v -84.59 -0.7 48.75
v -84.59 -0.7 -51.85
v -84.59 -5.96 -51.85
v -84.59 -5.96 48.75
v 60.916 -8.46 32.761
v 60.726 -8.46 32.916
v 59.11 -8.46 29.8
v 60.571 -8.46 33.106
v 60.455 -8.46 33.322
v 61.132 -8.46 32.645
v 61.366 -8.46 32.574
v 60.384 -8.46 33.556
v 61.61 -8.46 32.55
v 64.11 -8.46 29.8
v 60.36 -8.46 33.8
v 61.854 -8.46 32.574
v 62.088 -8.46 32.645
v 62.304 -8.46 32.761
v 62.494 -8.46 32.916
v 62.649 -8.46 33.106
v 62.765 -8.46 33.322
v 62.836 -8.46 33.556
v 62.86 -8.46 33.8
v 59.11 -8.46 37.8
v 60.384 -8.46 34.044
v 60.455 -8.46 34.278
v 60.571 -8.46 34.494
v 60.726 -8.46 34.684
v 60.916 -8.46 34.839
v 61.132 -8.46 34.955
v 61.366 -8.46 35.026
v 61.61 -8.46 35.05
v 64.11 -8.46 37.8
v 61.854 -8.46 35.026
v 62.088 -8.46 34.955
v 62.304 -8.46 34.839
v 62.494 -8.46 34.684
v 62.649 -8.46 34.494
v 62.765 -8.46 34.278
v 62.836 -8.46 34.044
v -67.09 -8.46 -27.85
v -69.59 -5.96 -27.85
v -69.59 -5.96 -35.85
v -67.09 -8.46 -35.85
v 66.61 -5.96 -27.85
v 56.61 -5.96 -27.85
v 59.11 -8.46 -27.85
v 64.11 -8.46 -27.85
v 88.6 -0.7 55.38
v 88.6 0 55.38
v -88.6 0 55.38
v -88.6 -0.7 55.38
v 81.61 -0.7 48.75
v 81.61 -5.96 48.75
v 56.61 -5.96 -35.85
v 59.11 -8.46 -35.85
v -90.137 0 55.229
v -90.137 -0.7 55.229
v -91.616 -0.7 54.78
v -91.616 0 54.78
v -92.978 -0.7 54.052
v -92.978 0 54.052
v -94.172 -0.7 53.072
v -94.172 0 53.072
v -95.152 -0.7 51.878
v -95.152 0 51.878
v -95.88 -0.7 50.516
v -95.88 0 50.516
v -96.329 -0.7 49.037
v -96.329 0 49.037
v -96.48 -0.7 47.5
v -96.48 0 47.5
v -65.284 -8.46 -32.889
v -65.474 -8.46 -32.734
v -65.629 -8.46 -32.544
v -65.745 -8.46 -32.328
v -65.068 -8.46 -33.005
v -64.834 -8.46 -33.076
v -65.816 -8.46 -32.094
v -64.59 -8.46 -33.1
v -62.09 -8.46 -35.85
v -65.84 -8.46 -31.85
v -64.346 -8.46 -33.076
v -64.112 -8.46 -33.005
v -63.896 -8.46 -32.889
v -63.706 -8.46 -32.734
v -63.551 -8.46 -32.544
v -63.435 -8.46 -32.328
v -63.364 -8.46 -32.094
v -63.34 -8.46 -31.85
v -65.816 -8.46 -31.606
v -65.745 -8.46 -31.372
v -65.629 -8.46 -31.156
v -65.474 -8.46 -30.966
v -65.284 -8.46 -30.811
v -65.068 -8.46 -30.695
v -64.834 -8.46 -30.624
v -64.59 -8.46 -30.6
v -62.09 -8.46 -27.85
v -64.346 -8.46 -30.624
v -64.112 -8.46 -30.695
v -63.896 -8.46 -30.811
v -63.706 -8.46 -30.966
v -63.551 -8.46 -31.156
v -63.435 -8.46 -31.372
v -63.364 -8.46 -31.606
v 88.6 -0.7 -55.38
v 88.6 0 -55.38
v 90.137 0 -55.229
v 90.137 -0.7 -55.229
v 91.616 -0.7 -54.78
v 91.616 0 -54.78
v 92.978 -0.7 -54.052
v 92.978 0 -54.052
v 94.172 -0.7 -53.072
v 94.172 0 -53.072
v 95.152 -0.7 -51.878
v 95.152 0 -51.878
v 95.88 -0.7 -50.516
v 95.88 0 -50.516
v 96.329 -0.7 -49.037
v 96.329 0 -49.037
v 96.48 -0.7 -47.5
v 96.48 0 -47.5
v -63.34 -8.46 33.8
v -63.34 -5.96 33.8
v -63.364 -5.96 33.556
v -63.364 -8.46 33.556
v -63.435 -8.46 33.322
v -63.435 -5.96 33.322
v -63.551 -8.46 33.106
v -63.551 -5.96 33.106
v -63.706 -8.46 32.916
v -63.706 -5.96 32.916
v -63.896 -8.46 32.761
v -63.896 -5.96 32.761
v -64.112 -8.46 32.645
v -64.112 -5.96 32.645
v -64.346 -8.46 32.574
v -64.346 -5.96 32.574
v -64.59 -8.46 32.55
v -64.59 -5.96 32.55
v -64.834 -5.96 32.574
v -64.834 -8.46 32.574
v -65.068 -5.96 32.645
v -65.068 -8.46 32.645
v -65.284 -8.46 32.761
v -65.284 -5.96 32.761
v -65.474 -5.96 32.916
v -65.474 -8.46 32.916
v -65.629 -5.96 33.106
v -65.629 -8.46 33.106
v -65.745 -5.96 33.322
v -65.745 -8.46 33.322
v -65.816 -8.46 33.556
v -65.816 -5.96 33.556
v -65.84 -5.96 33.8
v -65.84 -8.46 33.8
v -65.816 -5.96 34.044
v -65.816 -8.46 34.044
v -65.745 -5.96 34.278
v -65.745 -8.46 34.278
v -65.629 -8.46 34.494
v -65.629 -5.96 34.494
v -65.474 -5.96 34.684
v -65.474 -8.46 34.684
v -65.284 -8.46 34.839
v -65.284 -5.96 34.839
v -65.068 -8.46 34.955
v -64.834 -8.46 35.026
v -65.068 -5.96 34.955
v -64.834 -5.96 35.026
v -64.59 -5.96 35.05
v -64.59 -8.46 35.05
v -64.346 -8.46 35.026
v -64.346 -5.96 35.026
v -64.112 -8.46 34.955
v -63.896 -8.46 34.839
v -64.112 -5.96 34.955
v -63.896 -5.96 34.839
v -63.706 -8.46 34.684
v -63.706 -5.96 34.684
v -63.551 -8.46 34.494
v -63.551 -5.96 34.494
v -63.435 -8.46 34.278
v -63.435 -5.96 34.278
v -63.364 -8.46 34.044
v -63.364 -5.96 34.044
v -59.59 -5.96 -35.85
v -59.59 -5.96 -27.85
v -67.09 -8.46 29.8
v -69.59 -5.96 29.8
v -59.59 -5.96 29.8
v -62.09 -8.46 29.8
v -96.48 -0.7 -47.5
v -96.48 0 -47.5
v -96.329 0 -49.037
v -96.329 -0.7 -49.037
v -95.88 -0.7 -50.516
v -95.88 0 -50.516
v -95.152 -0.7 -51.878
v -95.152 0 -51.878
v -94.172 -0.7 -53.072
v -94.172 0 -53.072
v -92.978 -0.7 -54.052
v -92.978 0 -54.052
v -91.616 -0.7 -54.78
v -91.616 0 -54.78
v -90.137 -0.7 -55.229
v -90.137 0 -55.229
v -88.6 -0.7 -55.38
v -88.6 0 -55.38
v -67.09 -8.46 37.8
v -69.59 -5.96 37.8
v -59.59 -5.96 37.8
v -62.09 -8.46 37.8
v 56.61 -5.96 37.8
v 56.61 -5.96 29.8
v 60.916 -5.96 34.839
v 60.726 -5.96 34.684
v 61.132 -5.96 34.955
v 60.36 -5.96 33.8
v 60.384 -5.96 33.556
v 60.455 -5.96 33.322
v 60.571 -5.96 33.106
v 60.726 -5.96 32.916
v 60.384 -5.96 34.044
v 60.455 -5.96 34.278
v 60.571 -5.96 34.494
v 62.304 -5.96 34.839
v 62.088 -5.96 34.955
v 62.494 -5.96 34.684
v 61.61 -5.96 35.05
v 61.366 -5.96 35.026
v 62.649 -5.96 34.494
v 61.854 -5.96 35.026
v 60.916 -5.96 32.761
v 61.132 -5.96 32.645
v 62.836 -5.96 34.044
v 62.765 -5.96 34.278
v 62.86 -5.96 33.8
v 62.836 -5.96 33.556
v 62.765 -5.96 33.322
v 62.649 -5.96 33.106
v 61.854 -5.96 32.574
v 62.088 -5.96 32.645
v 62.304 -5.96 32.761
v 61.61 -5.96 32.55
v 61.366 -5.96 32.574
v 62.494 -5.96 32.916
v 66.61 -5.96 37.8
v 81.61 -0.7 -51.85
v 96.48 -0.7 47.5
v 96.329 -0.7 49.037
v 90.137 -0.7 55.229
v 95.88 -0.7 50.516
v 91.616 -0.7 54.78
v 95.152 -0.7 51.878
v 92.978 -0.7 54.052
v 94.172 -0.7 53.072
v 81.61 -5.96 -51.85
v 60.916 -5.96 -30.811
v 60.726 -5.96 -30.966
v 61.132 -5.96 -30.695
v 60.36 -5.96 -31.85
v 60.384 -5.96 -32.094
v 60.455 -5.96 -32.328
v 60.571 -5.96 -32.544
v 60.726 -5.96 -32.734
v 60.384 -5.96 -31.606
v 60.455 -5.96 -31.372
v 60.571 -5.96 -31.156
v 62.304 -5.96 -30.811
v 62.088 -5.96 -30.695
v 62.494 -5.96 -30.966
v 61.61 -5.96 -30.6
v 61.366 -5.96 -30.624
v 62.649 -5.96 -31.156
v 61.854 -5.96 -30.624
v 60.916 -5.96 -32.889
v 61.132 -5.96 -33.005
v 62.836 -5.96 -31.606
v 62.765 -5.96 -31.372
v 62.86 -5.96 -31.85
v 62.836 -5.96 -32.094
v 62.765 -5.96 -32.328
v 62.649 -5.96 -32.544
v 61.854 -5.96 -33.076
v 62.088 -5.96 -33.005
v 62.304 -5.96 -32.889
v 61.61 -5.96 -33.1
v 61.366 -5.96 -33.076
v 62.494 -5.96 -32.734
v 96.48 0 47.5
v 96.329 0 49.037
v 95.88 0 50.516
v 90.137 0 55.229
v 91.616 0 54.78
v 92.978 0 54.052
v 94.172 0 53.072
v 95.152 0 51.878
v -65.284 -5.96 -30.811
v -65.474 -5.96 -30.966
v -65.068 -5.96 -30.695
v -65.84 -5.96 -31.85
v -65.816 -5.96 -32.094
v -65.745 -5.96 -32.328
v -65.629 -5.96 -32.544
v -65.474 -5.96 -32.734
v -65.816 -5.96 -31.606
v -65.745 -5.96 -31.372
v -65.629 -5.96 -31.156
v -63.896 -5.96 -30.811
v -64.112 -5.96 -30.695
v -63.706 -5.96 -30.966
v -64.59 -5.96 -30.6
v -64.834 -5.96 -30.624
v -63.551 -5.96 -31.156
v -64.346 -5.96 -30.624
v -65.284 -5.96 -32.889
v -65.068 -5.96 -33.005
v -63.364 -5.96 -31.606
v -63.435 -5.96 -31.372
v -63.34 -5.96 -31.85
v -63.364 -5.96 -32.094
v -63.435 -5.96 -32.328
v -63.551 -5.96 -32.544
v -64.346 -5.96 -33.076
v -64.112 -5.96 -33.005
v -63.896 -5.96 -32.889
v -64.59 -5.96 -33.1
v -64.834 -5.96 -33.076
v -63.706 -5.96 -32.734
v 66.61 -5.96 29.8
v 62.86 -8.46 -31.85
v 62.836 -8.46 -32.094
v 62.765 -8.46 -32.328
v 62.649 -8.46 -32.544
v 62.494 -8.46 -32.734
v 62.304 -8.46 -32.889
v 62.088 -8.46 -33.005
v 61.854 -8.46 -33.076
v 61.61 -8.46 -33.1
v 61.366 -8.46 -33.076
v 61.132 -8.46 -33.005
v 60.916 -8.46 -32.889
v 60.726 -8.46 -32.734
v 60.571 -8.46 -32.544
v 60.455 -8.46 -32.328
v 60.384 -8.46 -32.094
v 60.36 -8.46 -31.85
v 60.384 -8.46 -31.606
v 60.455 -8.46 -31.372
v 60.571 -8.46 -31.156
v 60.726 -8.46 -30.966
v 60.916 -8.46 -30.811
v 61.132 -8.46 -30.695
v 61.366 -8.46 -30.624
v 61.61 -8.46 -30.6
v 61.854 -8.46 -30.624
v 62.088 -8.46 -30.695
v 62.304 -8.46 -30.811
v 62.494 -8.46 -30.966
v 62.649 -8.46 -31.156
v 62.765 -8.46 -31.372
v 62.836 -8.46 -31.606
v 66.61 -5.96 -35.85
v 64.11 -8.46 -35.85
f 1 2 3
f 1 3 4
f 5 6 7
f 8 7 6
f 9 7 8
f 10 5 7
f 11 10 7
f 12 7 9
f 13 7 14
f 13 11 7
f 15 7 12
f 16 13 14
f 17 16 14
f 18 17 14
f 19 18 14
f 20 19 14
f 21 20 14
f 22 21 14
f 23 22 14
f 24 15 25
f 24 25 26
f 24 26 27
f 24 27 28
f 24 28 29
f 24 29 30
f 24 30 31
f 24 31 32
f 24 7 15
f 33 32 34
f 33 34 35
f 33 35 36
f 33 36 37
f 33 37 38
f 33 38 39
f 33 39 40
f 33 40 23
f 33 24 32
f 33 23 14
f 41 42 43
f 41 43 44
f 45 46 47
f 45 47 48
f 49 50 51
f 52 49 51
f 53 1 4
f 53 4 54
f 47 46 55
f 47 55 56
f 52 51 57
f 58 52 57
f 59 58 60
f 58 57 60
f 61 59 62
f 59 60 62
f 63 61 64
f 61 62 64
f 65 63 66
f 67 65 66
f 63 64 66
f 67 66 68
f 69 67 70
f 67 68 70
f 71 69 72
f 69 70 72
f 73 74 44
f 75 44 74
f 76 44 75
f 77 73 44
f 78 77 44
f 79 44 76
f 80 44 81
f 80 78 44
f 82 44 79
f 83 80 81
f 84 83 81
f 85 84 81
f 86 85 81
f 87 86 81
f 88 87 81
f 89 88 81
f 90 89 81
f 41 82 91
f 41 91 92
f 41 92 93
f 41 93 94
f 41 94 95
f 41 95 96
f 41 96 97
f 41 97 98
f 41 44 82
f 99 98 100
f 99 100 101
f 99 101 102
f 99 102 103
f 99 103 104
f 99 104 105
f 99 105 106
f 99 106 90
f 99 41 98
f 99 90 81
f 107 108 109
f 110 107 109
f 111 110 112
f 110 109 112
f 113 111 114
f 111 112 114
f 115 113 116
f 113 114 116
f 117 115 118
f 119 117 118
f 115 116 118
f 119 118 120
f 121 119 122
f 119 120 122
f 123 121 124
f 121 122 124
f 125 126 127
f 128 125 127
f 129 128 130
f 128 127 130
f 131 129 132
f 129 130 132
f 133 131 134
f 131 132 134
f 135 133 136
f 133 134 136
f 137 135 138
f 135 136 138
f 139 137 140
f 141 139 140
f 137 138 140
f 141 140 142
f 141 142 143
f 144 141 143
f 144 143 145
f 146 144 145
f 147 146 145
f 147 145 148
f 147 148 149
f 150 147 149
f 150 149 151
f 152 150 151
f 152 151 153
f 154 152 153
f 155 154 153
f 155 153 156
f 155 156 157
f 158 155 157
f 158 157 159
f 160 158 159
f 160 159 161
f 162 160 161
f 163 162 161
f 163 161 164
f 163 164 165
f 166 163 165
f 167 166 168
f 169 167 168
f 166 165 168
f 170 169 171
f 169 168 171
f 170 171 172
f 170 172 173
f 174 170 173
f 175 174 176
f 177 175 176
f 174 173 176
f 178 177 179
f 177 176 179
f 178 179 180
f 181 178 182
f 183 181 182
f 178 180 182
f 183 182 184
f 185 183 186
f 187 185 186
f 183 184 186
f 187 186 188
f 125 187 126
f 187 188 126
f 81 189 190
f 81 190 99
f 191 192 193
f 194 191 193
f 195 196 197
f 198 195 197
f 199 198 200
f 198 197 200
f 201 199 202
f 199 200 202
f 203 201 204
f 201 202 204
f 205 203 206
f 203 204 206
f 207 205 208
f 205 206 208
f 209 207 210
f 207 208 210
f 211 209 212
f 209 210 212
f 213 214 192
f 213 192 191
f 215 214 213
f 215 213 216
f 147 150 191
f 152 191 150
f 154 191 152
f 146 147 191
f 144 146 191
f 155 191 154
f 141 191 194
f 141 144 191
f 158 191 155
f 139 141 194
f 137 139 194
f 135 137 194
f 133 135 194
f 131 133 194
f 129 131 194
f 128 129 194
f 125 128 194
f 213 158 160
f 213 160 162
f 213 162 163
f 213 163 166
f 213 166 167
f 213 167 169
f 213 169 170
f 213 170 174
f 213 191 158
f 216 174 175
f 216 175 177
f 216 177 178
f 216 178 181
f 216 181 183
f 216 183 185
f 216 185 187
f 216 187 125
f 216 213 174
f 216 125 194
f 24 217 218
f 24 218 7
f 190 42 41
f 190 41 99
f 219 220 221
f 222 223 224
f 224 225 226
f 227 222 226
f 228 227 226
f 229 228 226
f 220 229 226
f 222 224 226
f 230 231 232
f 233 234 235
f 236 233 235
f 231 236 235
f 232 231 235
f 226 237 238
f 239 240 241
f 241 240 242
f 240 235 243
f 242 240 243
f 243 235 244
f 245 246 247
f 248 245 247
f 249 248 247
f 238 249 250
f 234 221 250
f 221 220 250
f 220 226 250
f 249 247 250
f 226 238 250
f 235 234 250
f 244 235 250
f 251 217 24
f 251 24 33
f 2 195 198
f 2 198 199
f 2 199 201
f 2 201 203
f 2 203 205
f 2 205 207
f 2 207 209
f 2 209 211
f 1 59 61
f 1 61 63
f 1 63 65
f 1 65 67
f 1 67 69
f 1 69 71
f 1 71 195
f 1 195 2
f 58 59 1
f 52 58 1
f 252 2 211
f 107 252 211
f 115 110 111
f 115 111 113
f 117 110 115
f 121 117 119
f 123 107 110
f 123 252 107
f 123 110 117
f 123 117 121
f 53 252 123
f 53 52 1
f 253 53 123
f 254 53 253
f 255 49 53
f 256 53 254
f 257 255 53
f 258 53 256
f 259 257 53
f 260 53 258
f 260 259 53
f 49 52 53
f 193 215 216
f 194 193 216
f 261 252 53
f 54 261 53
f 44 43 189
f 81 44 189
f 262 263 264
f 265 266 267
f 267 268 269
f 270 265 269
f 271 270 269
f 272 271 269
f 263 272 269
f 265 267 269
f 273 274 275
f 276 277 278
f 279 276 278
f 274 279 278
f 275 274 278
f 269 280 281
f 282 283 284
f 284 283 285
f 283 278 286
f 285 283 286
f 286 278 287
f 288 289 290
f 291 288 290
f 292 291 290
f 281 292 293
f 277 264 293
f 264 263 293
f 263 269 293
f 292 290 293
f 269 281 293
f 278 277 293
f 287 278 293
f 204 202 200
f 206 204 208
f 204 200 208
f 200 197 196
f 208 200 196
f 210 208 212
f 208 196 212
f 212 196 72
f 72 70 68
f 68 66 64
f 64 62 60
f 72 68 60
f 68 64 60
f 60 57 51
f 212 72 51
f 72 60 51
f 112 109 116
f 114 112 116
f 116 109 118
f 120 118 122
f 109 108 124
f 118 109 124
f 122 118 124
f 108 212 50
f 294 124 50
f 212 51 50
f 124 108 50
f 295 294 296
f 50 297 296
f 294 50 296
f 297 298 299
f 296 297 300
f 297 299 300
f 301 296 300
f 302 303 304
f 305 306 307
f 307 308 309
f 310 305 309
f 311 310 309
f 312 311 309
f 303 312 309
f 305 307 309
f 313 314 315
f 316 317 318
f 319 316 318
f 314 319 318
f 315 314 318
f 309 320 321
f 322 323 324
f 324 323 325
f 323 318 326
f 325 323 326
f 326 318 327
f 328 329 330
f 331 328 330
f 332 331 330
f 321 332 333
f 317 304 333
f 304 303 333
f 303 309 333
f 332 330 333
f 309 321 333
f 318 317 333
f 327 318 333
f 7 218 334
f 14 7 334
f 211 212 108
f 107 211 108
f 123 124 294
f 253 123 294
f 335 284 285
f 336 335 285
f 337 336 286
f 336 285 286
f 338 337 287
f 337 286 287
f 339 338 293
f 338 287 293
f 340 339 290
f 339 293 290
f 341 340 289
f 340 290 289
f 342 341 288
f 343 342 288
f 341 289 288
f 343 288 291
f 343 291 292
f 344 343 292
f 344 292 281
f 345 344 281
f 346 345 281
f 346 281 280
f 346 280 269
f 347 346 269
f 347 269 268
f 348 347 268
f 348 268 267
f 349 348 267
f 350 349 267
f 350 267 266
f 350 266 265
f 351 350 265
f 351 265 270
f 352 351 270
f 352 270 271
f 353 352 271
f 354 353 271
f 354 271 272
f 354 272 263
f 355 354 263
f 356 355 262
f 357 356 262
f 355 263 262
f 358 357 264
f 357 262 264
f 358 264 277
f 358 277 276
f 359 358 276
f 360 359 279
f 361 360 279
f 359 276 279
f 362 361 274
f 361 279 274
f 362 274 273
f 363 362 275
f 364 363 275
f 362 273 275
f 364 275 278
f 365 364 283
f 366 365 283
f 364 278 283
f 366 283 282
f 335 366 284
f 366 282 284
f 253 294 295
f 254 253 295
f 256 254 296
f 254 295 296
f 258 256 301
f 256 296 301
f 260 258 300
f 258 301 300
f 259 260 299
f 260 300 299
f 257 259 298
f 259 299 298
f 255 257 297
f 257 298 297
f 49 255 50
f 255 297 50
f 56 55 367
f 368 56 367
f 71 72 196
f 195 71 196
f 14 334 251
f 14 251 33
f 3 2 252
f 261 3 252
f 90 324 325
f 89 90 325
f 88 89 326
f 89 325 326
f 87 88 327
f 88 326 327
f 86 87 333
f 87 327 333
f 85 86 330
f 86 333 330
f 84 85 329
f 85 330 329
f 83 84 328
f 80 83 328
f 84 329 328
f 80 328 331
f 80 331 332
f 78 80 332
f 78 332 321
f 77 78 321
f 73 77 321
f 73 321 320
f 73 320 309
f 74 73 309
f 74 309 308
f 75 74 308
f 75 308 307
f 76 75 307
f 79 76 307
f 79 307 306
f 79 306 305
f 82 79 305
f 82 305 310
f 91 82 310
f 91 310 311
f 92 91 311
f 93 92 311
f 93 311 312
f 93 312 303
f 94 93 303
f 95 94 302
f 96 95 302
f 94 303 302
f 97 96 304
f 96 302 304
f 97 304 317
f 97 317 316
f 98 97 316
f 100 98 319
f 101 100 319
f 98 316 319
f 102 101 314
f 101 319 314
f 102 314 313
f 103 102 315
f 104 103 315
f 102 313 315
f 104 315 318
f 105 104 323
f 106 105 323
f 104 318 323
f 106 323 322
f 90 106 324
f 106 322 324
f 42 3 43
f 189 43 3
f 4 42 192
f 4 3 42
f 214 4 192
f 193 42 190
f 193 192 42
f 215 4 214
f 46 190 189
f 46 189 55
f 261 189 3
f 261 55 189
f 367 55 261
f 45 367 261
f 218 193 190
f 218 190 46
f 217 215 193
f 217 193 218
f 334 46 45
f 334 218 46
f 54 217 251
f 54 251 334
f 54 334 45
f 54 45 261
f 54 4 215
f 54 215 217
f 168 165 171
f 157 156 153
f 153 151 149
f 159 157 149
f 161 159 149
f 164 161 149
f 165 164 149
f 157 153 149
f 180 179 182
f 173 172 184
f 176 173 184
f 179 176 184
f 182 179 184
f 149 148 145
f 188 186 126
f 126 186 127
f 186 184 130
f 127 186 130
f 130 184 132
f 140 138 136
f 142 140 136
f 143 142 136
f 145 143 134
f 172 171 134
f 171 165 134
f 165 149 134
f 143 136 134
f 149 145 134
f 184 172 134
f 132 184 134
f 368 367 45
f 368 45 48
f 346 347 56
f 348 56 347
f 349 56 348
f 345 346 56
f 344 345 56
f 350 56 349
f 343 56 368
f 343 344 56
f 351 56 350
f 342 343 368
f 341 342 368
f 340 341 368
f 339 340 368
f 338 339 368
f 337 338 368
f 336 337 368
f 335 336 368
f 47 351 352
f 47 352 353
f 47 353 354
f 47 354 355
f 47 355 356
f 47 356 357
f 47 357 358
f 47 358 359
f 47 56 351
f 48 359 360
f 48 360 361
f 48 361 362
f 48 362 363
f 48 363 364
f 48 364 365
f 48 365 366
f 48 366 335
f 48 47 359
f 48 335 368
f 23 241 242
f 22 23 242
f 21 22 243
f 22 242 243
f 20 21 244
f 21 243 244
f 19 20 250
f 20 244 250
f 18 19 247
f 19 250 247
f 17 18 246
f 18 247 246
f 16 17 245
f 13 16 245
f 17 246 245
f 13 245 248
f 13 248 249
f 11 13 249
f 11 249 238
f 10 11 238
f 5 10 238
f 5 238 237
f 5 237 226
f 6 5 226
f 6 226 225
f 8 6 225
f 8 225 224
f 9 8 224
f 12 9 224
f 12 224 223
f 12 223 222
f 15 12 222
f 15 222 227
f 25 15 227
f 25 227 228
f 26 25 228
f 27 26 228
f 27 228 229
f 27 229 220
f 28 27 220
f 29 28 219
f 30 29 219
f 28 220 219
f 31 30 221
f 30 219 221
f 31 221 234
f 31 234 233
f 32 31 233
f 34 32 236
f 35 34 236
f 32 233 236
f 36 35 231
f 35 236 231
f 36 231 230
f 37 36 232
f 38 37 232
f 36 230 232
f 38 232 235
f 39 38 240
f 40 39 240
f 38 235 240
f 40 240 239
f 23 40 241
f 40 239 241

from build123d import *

# Parameters (mm, degrees)
F0_W         = 166.2
F0_H         = 100.6
F1_DEPTH     = 5.96
F2_DEPTH     = 0.7
F3_W         = 15
F3_H         = 8
F4_DEPTH     = 2.5
F5_T4_DEPTH  = 33.7168298797
F5_T9_DEPTH  = 33.7168298797
F5_T14_DEPTH = 33.7168298797
F5_T19_DEPTH = 33.7168298797
F5_T24_DEPTH = 33.7168298797
F5_T29_DEPTH = 33.7168298797
F5_T34_DEPTH = 33.7168298797
F5_T39_DEPTH = 33.7168298797
F6_D         = 2.5
F6_DEPTH     = 2.501


# Not quite as in the source:
# - a fillet or chamfer that OpenCascade refuses, or shapes differently, is made with other operations: its cross-section is extruded or revolved along the edge and cut away or added


with BuildPart() as f1:
    # F0 (on Front) → F1 (new body)
    with BuildSketch(Plane.XZ):
        with Locations((-1.49, -1.55)):
            Rectangle(F0_W, F0_H)
    extrude(amount=F1_DEPTH)

    # F0 (on Front) → F2 (join)
    with BuildSketch(Plane.XZ):
        with BuildLine():
            ThreePointArc((-96.48, -47.5), (-94.1720014358, -53.0720014358), (-88.6, -55.38))
            Line((-88.6, -55.38), (88.6, -55.38))
            ThreePointArc((88.6, -55.38), (94.1720014357, -53.0720014357), (96.48, -47.5))
            Line((96.48, -47.5), (96.48, 47.5))
            ThreePointArc((96.48, 47.5), (94.1720014358, 53.0720014358), (88.6, 55.38))
            Line((88.6, 55.38), (-88.6, 55.38))
            ThreePointArc((-88.6, 55.38), (-94.1720014357, 53.0720014357), (-96.48, 47.5))
            Line((-96.48, 47.5), (-96.48, -47.5))
        make_face()
        with Locations((-1.49, -1.55)):
            Rectangle(F0_W, F0_H, mode=Mode.SUBTRACT)
    extrude(amount=F2_DEPTH)

    # F3 (on face) → F4 (join)
    with BuildSketch(Plane.XZ.offset(5.96)):
        with Locations((-64.59, 33.8)):
            Rectangle(F3_W, F3_H)
        with Locations((-64.59, -31.85)):
            Rectangle(F3_W, F3_H)
        with Locations((61.61, -31.85)):
            Rectangle(F3_W, F3_H)
        with Locations((61.61, 33.8)):
            Rectangle(F3_W, F3_H)
    extrude(amount=F4_DEPTH)

    # F5: chamfer of 5 on 8 edges, made by hand


with BuildPart() as f5_tool2:
    # F5_s3 → F5_t4 (new body)
    with BuildSketch(Plane.XY.offset(50.6584149398)):
        Polygon((-72.09, -3.46), (-67.09, -8.46), (-72.09, -8.46), align=None)
    extrude(amount=-F5_T4_DEPTH)

    split(bisect_by=Plane.XZ.offset(5.96), keep=Keep.TOP)


with BuildPart() as f1_1:
    add(f1.part)

    # F5_t1: cut F5_tool2
    add(f5_tool2.part, mode=Mode.SUBTRACT)


with BuildPart() as f5_tool7:
    # F5_s8 → F5_t9 (new body)
    with BuildSketch(Plane.XY.offset(16.9415850602)):
        Polygon((-57.09, -3.46), (-62.09, -8.46), (-57.09, -8.46), align=None)
    extrude(amount=F5_T9_DEPTH)

    split(bisect_by=Plane.XZ.offset(5.96), keep=Keep.TOP)


with BuildPart() as f1_2:
    add(f1_1.part)

    # F5_t6: cut F5_tool7
    add(f5_tool7.part, mode=Mode.SUBTRACT)


with BuildPart() as f5_tool12:
    # F5_s13 → F5_t14 (new body)
    with BuildSketch(Plane.XY.offset(-14.9915850602)):
        Polygon((-72.09, -3.46), (-67.09, -8.46), (-72.09, -8.46), align=None)
    extrude(amount=-F5_T14_DEPTH)

    split(bisect_by=Plane.XZ.offset(5.96), keep=Keep.TOP)


with BuildPart() as f1_3:
    add(f1_2.part)

    # F5_t11: cut F5_tool12
    add(f5_tool12.part, mode=Mode.SUBTRACT)


with BuildPart() as f5_tool17:
    # F5_s18 → F5_t19 (new body)
    with BuildSketch(Plane.XY.offset(-48.7084149398)):
        Polygon((-57.09, -3.46), (-62.09, -8.46), (-57.09, -8.46), align=None)
    extrude(amount=F5_T19_DEPTH)

    split(bisect_by=Plane.XZ.offset(5.96), keep=Keep.TOP)


with BuildPart() as f1_4:
    add(f1_3.part)

    # F5_t16: cut F5_tool17
    add(f5_tool17.part, mode=Mode.SUBTRACT)


with BuildPart() as f5_tool22:
    # F5_s23 → F5_t24 (new body)
    with BuildSketch(Plane.XY.offset(50.6584149398)):
        Polygon((54.11, -3.46), (59.11, -8.46), (54.11, -8.46), align=None)
    extrude(amount=-F5_T24_DEPTH)

    split(bisect_by=Plane.XZ.offset(5.96), keep=Keep.TOP)


with BuildPart() as f1_5:
    add(f1_4.part)

    # F5_t21: cut F5_tool22
    add(f5_tool22.part, mode=Mode.SUBTRACT)


with BuildPart() as f5_tool27:
    # F5_s28 → F5_t29 (new body)
    with BuildSketch(Plane.XY.offset(16.9415850602)):
        Polygon((69.11, -3.46), (64.11, -8.46), (69.11, -8.46), align=None)
    extrude(amount=F5_T29_DEPTH)

    split(bisect_by=Plane.XZ.offset(5.96), keep=Keep.TOP)


with BuildPart() as f1_6:
    add(f1_5.part)

    # F5_t26: cut F5_tool27
    add(f5_tool27.part, mode=Mode.SUBTRACT)


with BuildPart() as f5_tool32:
    # F5_s33 → F5_t34 (new body)
    with BuildSketch(Plane.XY.offset(-14.9915850602)):
        Polygon((54.11, -3.46), (59.11, -8.46), (54.11, -8.46), align=None)
    extrude(amount=-F5_T34_DEPTH)

    split(bisect_by=Plane.XZ.offset(5.96), keep=Keep.TOP)


with BuildPart() as f1_7:
    add(f1_6.part)

    # F5_t31: cut F5_tool32
    add(f5_tool32.part, mode=Mode.SUBTRACT)


with BuildPart() as f5_tool37:
    # F5_s38 → F5_t39 (new body)
    with BuildSketch(Plane.XY.offset(-48.7084149398)):
        Polygon((69.11, -3.46), (64.11, -8.46), (69.11, -8.46), align=None)
    extrude(amount=F5_T39_DEPTH)

    split(bisect_by=Plane.XZ.offset(5.96), keep=Keep.TOP)


with BuildPart() as f1_8:
    add(f1_7.part)

    # F5_t36: cut F5_tool37
    add(f5_tool37.part, mode=Mode.SUBTRACT)

    # F6 (through all, one way)
    with BuildSketch(Plane(origin=(0, -5.96, 0), x_dir=(1, 0, 0), z_dir=(0, 1, 0))):
        with Locations((-64.59, -33.8), (-64.59, 31.85), (61.61, 31.85), (61.61, -33.8)):
            Circle(F6_D / 2)
    extrude(amount=-F6_DEPTH, mode=Mode.SUBTRACT)


solid = f1_8.part
